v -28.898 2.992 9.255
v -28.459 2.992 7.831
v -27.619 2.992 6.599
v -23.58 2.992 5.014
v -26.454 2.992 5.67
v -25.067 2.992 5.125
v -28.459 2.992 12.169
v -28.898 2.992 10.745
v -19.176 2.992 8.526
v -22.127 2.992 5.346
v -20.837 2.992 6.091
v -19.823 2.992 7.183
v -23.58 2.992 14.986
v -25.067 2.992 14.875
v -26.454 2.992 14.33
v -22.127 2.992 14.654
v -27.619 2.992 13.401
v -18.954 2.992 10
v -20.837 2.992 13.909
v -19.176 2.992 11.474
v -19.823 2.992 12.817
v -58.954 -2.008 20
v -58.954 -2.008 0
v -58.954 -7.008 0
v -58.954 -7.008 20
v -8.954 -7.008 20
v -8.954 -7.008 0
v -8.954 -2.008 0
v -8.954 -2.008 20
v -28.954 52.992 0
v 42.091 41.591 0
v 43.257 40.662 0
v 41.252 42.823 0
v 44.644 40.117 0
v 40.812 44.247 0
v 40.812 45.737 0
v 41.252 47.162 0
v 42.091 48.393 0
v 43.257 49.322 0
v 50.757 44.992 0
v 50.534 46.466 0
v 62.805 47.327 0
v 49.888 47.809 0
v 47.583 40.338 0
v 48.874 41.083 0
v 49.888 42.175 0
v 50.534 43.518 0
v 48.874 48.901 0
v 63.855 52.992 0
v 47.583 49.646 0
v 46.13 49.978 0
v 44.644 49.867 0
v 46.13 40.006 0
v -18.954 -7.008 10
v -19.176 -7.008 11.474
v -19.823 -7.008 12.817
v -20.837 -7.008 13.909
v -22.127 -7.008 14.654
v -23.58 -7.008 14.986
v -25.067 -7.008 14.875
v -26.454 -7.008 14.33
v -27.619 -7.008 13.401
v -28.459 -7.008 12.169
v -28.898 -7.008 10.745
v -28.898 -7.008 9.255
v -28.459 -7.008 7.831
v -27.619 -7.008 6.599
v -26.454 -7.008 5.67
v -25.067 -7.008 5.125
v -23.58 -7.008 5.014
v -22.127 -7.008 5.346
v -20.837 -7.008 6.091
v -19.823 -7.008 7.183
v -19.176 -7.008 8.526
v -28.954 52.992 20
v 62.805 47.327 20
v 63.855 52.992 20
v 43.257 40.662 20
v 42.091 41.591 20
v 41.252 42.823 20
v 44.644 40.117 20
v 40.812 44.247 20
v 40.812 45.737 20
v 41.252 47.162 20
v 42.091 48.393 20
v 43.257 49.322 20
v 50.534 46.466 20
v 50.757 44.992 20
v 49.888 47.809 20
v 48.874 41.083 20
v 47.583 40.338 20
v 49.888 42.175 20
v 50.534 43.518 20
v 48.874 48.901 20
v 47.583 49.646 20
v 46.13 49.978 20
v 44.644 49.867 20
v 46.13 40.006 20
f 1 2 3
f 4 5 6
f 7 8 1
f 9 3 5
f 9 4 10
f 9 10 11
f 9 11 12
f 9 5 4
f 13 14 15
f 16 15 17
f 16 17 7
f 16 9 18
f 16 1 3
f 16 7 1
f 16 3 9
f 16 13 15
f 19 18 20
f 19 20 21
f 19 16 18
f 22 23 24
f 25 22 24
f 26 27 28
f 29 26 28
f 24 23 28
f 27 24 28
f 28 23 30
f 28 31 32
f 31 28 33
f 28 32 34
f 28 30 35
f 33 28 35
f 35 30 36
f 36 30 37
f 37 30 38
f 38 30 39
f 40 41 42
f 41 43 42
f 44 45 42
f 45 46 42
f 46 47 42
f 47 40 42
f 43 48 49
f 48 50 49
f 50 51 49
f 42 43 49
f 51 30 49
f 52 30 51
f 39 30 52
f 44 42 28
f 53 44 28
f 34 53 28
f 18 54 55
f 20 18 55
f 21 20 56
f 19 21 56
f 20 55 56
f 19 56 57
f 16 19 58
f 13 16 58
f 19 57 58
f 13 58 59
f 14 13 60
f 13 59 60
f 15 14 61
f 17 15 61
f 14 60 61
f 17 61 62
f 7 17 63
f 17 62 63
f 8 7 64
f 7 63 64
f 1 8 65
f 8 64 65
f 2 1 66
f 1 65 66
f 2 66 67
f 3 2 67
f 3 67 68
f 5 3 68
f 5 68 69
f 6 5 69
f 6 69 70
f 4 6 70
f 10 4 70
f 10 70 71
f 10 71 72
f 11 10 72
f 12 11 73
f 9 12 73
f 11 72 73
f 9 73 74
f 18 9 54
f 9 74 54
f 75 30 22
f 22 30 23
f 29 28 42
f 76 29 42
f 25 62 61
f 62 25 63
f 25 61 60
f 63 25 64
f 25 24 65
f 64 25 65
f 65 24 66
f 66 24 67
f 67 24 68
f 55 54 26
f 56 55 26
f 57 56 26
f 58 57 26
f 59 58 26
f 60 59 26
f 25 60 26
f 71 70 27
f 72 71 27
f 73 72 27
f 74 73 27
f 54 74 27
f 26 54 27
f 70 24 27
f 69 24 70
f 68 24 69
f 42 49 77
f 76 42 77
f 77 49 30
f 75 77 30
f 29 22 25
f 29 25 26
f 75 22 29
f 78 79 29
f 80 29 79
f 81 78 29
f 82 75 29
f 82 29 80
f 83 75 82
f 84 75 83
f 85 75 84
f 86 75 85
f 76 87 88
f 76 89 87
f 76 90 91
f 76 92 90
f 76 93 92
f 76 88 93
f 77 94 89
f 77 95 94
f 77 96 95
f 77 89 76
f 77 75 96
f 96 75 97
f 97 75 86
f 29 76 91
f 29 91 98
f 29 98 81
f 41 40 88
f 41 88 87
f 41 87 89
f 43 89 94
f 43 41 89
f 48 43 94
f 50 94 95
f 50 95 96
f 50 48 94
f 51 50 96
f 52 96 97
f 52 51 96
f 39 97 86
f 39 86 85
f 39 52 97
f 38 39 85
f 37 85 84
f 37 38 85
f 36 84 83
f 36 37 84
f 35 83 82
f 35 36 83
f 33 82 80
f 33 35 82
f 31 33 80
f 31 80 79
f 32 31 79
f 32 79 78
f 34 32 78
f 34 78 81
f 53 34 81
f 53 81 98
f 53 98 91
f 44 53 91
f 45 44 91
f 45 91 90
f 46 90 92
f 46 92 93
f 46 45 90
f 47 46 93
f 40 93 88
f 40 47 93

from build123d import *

# Parameters (mm, degrees)
SKETCH_1_R          = 5
EXTRUDE_1_DEPTH     = 20
CHAMFER_1_SIZE      = 10
CHAMFER_1_SIZE2     = 7.191291792
SKETCH_2_R          = 5
CUT_EXTRUDE_1_DEPTH = 10


with BuildPart() as part:
    # 草图1 → 凸台-拉伸1 (new body)
    with BuildSketch(Plane.XY):
        Polygon((-58.954112629, -2.007906554), (-58.954112629, -7.007906554), (-8.954112629, -7.007906554), (-8.954112629, -2.007906554), (71.045887371, 52.992093446), (-28.954112629, 52.992093446), align=None)
        with Locations((45.756585656, 44.992093446)):
            Circle(SKETCH_1_R, mode=Mode.SUBTRACT)
    extrude(amount=EXTRUDE_1_DEPTH)

    # 倒角1
    chamfer_1_edges = [part.edges().sort_by_distance(p)[0] for p in [
        (71.045887371, 52.992093446, 10),
    ]]
    chamfer_1_side = [part.faces().sort_by_distance(p)[0] for p in [
        (31.045887371, 25.492093446, 10),
    ]]
    chamfer(chamfer_1_edges, length=CHAMFER_1_SIZE, length2=CHAMFER_1_SIZE2, reference=chamfer_1_side[0])

    # 草图2 → 切除-拉伸1 (cut)
    with BuildSketch(Plane.XZ.offset(7.007906554)):
        with Locations((-23.954112629, 10)):
            Circle(SKETCH_2_R)
    extrude(amount=-CUT_EXTRUDE_1_DEPTH, mode=Mode.SUBTRACT)


solid = part.part
